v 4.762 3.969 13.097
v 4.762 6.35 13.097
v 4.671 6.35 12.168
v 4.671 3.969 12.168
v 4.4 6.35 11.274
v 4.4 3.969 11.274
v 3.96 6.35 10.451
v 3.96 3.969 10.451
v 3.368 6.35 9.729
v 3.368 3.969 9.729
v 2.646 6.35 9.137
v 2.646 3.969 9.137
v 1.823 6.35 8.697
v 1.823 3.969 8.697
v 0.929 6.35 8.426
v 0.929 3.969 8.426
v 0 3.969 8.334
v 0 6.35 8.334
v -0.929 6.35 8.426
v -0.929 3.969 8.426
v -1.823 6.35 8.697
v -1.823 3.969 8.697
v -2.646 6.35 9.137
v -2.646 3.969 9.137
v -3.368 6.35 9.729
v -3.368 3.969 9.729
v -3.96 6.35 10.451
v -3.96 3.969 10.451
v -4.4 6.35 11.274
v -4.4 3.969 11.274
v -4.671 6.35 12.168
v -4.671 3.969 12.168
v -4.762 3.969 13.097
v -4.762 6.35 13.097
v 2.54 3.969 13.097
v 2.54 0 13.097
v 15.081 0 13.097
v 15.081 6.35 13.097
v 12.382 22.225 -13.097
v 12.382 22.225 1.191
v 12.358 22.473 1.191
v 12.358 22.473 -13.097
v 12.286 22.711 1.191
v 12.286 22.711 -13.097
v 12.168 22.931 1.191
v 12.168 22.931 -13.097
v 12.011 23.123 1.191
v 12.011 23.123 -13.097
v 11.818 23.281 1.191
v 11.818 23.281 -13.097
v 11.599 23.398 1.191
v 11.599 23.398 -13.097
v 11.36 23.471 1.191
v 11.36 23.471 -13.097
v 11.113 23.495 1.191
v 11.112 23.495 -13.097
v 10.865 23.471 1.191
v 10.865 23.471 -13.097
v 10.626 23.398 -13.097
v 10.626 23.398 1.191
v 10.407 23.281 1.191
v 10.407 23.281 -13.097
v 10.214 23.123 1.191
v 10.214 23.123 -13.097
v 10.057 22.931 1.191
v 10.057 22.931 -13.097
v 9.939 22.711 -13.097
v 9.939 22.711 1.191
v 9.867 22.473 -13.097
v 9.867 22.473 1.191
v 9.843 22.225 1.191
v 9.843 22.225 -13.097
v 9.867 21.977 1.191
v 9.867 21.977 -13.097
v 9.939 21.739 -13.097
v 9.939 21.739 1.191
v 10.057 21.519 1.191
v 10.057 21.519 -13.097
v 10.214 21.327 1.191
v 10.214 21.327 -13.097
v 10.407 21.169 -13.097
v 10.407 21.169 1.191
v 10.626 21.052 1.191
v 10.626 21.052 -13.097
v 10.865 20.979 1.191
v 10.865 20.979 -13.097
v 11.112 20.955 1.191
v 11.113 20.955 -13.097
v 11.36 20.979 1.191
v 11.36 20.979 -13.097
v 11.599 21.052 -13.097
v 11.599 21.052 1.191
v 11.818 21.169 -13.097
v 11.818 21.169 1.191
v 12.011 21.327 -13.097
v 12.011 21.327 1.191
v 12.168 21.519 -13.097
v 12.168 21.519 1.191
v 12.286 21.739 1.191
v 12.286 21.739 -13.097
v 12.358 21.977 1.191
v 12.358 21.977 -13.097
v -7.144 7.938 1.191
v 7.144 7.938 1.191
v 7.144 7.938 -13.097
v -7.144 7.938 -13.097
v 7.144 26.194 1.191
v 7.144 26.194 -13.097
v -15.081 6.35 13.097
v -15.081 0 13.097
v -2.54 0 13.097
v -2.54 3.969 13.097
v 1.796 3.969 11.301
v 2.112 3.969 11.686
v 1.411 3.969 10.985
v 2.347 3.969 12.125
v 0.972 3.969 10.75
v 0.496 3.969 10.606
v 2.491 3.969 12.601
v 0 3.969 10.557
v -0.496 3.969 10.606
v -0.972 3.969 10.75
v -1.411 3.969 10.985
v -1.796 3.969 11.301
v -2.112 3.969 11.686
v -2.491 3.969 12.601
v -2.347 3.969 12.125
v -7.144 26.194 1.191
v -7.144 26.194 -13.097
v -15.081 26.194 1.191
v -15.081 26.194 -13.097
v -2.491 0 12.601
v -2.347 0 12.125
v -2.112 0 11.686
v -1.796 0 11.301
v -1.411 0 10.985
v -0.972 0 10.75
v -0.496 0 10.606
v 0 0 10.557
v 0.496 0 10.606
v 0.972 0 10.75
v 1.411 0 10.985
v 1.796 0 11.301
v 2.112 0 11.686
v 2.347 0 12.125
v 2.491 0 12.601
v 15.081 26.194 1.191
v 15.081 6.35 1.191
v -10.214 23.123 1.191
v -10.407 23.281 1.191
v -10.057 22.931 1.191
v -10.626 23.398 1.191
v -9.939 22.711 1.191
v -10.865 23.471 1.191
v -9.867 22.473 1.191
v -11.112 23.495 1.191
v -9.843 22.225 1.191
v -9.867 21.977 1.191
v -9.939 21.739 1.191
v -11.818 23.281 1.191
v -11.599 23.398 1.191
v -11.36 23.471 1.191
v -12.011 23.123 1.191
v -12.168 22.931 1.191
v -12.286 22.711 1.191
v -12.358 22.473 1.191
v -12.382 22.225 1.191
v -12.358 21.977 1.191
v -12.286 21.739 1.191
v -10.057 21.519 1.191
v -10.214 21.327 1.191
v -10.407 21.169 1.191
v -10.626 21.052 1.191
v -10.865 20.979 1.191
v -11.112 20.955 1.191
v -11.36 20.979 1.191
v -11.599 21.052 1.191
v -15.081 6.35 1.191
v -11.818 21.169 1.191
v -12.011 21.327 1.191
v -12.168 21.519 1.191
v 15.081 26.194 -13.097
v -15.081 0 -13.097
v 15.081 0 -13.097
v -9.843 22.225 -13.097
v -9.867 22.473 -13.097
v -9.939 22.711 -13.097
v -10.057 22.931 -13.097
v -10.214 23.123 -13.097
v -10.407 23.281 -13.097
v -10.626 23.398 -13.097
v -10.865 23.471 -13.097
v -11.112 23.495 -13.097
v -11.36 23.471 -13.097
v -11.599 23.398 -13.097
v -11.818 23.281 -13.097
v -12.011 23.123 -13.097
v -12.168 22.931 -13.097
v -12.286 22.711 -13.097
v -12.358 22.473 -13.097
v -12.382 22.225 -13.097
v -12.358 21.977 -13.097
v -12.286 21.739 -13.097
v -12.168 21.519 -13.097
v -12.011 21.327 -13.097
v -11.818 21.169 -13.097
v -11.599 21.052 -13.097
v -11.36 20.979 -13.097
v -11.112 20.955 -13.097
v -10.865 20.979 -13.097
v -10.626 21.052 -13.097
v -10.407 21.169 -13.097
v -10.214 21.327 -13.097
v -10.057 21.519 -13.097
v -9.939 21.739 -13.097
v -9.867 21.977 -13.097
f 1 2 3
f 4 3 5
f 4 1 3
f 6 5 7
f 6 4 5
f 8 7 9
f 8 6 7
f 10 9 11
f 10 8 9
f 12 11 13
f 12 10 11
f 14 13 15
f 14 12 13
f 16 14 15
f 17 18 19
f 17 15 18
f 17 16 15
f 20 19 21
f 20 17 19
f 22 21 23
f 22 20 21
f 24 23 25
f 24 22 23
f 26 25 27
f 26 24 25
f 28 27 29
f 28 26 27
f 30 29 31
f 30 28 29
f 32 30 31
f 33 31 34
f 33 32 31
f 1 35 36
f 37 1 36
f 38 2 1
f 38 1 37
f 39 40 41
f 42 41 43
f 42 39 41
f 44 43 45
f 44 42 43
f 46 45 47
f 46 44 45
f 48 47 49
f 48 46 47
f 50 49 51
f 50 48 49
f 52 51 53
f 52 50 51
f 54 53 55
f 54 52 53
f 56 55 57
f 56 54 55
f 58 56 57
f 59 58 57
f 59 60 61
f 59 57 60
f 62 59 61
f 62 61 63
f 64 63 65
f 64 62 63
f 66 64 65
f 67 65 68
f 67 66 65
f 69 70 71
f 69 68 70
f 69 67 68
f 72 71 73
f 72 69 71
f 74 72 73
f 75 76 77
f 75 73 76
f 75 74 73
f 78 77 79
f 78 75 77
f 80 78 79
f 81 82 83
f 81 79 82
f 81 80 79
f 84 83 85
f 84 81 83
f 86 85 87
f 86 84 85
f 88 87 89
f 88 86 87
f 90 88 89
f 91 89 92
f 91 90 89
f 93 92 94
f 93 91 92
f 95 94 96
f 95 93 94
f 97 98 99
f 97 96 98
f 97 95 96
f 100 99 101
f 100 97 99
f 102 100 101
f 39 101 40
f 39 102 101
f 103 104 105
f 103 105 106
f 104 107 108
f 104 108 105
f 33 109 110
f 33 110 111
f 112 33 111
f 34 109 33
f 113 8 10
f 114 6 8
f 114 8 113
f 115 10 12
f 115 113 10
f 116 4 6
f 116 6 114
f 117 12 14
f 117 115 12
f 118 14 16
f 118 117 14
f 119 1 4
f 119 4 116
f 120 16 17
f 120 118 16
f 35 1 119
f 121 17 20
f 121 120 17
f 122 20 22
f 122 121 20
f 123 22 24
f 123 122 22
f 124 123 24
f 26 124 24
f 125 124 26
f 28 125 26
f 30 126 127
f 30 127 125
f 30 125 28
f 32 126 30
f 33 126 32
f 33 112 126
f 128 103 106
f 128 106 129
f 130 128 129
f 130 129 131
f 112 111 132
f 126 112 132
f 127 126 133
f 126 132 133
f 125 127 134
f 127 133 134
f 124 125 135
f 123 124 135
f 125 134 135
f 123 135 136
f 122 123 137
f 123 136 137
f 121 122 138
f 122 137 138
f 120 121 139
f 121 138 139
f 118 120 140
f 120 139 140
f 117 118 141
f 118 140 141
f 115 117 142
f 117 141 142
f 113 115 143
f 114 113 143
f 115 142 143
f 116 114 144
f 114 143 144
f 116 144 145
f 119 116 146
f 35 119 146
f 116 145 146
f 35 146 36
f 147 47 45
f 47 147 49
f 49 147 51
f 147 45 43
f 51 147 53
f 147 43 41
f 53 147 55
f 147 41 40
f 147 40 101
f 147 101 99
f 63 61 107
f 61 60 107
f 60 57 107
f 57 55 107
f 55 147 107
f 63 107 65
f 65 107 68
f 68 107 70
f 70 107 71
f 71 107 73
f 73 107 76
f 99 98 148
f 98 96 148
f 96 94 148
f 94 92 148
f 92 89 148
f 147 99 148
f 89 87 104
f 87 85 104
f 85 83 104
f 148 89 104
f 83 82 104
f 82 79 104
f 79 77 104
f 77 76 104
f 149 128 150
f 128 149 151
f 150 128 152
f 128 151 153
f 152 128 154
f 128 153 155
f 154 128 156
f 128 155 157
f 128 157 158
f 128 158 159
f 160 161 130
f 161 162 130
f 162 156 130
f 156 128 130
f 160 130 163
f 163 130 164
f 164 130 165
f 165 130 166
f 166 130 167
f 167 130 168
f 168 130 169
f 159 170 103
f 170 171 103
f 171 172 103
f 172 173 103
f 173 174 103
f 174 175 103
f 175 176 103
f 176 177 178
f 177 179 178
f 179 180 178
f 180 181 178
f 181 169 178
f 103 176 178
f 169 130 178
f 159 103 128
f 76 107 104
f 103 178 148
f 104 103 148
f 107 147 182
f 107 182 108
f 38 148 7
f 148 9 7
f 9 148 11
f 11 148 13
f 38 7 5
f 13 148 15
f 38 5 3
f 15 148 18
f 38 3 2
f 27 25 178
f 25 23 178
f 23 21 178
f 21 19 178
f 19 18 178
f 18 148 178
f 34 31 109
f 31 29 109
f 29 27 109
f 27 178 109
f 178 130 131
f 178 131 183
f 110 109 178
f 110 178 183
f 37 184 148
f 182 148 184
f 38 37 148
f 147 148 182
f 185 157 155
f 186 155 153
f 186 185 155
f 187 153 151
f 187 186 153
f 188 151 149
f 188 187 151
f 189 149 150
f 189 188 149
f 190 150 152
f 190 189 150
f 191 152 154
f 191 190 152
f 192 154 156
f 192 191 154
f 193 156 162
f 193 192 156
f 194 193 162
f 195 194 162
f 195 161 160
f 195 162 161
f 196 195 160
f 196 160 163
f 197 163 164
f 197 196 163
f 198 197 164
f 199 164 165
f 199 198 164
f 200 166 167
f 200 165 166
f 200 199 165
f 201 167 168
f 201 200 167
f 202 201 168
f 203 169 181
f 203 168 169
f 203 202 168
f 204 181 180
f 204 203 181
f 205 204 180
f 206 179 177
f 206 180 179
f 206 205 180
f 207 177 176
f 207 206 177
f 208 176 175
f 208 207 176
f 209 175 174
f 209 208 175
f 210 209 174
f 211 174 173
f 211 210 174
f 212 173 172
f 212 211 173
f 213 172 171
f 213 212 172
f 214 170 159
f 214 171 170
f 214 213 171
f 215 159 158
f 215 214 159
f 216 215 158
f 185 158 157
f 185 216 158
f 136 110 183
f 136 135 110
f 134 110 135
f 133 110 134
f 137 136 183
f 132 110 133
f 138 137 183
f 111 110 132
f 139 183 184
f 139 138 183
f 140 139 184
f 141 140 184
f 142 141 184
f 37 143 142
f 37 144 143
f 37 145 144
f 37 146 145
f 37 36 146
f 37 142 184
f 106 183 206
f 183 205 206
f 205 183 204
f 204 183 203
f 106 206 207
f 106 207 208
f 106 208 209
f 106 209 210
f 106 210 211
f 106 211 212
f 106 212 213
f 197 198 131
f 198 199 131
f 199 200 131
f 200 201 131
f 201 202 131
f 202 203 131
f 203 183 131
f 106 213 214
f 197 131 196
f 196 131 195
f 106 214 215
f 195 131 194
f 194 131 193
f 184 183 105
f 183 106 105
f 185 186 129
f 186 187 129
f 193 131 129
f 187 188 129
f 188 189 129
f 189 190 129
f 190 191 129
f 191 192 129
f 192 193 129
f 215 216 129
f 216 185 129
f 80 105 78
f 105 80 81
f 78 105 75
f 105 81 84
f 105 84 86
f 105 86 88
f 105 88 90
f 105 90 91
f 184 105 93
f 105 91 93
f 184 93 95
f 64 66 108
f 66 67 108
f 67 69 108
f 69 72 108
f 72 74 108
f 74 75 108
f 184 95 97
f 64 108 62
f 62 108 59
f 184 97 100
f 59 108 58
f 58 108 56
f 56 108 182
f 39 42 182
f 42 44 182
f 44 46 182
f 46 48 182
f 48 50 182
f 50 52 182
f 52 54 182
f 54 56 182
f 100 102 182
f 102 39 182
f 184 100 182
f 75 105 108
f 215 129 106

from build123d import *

# Parameters (mm, degrees)
F0_R     = 1.27
F1_DEPTH = 13.096875
F2_W     = 19.84375
F2_H     = 11.90625
F3_DEPTH = 30.1635
F5_DEPTH = 26.19475
F7_R     = 4.7625
F8_DEPTH = 22.226


with BuildPart() as f1:
    # F0 (on Top) → F1 (new body, symmetric)
    with BuildSketch(Plane.XY):
        Polygon((-15.08125, 0), (0, 0), (15.08125, 0), (15.08125, 26.19375), (7.14375, 26.19375), (7.14375, 7.9375), (0, 7.9375), (-7.14375, 7.9375), (-7.14375, 26.19375), (-15.08125, 26.19375), align=None)
        with Locations((-11.1125, 22.225)):
            Circle(F0_R, mode=Mode.SUBTRACT)
        with Locations((11.1125, 22.225)):
            Circle(F0_R, mode=Mode.SUBTRACT)
    extrude(amount=F1_DEPTH, both=True)

    # F2 (on face) → F3 (cut, through all)
    with BuildSketch(Plane(origin=(-15.08125, 0, 0), x_dir=(0, -1, 0), z_dir=(-1, 0, 0))):
        with Locations((-16.271875, 7.14375)):
            Rectangle(F2_W, F2_H)
    extrude(amount=-F3_DEPTH, mode=Mode.SUBTRACT)

    # F4 (on face) → F5 (cut, through all)
    with BuildSketch(Plane.XZ):
        with BuildLine():
            ThreePointArc((-2.54, 13.096875), (0, 10.556875), (2.54, 13.096875))
            Line((2.54, 13.096875), (-2.54, 13.096875))
        make_face()
    extrude(amount=-F5_DEPTH, mode=Mode.SUBTRACT)

    # F7 (on offset) → F8 (cut, through all)
    with BuildSketch(Plane(origin=(0, 3.96875, 0), x_dir=(-1, 0, 0), z_dir=(0, 1, 0))):
        with Locations((0, 13.096875)):
            Circle(F7_R)
    extrude(amount=F8_DEPTH, mode=Mode.SUBTRACT)


solid = f1.part
